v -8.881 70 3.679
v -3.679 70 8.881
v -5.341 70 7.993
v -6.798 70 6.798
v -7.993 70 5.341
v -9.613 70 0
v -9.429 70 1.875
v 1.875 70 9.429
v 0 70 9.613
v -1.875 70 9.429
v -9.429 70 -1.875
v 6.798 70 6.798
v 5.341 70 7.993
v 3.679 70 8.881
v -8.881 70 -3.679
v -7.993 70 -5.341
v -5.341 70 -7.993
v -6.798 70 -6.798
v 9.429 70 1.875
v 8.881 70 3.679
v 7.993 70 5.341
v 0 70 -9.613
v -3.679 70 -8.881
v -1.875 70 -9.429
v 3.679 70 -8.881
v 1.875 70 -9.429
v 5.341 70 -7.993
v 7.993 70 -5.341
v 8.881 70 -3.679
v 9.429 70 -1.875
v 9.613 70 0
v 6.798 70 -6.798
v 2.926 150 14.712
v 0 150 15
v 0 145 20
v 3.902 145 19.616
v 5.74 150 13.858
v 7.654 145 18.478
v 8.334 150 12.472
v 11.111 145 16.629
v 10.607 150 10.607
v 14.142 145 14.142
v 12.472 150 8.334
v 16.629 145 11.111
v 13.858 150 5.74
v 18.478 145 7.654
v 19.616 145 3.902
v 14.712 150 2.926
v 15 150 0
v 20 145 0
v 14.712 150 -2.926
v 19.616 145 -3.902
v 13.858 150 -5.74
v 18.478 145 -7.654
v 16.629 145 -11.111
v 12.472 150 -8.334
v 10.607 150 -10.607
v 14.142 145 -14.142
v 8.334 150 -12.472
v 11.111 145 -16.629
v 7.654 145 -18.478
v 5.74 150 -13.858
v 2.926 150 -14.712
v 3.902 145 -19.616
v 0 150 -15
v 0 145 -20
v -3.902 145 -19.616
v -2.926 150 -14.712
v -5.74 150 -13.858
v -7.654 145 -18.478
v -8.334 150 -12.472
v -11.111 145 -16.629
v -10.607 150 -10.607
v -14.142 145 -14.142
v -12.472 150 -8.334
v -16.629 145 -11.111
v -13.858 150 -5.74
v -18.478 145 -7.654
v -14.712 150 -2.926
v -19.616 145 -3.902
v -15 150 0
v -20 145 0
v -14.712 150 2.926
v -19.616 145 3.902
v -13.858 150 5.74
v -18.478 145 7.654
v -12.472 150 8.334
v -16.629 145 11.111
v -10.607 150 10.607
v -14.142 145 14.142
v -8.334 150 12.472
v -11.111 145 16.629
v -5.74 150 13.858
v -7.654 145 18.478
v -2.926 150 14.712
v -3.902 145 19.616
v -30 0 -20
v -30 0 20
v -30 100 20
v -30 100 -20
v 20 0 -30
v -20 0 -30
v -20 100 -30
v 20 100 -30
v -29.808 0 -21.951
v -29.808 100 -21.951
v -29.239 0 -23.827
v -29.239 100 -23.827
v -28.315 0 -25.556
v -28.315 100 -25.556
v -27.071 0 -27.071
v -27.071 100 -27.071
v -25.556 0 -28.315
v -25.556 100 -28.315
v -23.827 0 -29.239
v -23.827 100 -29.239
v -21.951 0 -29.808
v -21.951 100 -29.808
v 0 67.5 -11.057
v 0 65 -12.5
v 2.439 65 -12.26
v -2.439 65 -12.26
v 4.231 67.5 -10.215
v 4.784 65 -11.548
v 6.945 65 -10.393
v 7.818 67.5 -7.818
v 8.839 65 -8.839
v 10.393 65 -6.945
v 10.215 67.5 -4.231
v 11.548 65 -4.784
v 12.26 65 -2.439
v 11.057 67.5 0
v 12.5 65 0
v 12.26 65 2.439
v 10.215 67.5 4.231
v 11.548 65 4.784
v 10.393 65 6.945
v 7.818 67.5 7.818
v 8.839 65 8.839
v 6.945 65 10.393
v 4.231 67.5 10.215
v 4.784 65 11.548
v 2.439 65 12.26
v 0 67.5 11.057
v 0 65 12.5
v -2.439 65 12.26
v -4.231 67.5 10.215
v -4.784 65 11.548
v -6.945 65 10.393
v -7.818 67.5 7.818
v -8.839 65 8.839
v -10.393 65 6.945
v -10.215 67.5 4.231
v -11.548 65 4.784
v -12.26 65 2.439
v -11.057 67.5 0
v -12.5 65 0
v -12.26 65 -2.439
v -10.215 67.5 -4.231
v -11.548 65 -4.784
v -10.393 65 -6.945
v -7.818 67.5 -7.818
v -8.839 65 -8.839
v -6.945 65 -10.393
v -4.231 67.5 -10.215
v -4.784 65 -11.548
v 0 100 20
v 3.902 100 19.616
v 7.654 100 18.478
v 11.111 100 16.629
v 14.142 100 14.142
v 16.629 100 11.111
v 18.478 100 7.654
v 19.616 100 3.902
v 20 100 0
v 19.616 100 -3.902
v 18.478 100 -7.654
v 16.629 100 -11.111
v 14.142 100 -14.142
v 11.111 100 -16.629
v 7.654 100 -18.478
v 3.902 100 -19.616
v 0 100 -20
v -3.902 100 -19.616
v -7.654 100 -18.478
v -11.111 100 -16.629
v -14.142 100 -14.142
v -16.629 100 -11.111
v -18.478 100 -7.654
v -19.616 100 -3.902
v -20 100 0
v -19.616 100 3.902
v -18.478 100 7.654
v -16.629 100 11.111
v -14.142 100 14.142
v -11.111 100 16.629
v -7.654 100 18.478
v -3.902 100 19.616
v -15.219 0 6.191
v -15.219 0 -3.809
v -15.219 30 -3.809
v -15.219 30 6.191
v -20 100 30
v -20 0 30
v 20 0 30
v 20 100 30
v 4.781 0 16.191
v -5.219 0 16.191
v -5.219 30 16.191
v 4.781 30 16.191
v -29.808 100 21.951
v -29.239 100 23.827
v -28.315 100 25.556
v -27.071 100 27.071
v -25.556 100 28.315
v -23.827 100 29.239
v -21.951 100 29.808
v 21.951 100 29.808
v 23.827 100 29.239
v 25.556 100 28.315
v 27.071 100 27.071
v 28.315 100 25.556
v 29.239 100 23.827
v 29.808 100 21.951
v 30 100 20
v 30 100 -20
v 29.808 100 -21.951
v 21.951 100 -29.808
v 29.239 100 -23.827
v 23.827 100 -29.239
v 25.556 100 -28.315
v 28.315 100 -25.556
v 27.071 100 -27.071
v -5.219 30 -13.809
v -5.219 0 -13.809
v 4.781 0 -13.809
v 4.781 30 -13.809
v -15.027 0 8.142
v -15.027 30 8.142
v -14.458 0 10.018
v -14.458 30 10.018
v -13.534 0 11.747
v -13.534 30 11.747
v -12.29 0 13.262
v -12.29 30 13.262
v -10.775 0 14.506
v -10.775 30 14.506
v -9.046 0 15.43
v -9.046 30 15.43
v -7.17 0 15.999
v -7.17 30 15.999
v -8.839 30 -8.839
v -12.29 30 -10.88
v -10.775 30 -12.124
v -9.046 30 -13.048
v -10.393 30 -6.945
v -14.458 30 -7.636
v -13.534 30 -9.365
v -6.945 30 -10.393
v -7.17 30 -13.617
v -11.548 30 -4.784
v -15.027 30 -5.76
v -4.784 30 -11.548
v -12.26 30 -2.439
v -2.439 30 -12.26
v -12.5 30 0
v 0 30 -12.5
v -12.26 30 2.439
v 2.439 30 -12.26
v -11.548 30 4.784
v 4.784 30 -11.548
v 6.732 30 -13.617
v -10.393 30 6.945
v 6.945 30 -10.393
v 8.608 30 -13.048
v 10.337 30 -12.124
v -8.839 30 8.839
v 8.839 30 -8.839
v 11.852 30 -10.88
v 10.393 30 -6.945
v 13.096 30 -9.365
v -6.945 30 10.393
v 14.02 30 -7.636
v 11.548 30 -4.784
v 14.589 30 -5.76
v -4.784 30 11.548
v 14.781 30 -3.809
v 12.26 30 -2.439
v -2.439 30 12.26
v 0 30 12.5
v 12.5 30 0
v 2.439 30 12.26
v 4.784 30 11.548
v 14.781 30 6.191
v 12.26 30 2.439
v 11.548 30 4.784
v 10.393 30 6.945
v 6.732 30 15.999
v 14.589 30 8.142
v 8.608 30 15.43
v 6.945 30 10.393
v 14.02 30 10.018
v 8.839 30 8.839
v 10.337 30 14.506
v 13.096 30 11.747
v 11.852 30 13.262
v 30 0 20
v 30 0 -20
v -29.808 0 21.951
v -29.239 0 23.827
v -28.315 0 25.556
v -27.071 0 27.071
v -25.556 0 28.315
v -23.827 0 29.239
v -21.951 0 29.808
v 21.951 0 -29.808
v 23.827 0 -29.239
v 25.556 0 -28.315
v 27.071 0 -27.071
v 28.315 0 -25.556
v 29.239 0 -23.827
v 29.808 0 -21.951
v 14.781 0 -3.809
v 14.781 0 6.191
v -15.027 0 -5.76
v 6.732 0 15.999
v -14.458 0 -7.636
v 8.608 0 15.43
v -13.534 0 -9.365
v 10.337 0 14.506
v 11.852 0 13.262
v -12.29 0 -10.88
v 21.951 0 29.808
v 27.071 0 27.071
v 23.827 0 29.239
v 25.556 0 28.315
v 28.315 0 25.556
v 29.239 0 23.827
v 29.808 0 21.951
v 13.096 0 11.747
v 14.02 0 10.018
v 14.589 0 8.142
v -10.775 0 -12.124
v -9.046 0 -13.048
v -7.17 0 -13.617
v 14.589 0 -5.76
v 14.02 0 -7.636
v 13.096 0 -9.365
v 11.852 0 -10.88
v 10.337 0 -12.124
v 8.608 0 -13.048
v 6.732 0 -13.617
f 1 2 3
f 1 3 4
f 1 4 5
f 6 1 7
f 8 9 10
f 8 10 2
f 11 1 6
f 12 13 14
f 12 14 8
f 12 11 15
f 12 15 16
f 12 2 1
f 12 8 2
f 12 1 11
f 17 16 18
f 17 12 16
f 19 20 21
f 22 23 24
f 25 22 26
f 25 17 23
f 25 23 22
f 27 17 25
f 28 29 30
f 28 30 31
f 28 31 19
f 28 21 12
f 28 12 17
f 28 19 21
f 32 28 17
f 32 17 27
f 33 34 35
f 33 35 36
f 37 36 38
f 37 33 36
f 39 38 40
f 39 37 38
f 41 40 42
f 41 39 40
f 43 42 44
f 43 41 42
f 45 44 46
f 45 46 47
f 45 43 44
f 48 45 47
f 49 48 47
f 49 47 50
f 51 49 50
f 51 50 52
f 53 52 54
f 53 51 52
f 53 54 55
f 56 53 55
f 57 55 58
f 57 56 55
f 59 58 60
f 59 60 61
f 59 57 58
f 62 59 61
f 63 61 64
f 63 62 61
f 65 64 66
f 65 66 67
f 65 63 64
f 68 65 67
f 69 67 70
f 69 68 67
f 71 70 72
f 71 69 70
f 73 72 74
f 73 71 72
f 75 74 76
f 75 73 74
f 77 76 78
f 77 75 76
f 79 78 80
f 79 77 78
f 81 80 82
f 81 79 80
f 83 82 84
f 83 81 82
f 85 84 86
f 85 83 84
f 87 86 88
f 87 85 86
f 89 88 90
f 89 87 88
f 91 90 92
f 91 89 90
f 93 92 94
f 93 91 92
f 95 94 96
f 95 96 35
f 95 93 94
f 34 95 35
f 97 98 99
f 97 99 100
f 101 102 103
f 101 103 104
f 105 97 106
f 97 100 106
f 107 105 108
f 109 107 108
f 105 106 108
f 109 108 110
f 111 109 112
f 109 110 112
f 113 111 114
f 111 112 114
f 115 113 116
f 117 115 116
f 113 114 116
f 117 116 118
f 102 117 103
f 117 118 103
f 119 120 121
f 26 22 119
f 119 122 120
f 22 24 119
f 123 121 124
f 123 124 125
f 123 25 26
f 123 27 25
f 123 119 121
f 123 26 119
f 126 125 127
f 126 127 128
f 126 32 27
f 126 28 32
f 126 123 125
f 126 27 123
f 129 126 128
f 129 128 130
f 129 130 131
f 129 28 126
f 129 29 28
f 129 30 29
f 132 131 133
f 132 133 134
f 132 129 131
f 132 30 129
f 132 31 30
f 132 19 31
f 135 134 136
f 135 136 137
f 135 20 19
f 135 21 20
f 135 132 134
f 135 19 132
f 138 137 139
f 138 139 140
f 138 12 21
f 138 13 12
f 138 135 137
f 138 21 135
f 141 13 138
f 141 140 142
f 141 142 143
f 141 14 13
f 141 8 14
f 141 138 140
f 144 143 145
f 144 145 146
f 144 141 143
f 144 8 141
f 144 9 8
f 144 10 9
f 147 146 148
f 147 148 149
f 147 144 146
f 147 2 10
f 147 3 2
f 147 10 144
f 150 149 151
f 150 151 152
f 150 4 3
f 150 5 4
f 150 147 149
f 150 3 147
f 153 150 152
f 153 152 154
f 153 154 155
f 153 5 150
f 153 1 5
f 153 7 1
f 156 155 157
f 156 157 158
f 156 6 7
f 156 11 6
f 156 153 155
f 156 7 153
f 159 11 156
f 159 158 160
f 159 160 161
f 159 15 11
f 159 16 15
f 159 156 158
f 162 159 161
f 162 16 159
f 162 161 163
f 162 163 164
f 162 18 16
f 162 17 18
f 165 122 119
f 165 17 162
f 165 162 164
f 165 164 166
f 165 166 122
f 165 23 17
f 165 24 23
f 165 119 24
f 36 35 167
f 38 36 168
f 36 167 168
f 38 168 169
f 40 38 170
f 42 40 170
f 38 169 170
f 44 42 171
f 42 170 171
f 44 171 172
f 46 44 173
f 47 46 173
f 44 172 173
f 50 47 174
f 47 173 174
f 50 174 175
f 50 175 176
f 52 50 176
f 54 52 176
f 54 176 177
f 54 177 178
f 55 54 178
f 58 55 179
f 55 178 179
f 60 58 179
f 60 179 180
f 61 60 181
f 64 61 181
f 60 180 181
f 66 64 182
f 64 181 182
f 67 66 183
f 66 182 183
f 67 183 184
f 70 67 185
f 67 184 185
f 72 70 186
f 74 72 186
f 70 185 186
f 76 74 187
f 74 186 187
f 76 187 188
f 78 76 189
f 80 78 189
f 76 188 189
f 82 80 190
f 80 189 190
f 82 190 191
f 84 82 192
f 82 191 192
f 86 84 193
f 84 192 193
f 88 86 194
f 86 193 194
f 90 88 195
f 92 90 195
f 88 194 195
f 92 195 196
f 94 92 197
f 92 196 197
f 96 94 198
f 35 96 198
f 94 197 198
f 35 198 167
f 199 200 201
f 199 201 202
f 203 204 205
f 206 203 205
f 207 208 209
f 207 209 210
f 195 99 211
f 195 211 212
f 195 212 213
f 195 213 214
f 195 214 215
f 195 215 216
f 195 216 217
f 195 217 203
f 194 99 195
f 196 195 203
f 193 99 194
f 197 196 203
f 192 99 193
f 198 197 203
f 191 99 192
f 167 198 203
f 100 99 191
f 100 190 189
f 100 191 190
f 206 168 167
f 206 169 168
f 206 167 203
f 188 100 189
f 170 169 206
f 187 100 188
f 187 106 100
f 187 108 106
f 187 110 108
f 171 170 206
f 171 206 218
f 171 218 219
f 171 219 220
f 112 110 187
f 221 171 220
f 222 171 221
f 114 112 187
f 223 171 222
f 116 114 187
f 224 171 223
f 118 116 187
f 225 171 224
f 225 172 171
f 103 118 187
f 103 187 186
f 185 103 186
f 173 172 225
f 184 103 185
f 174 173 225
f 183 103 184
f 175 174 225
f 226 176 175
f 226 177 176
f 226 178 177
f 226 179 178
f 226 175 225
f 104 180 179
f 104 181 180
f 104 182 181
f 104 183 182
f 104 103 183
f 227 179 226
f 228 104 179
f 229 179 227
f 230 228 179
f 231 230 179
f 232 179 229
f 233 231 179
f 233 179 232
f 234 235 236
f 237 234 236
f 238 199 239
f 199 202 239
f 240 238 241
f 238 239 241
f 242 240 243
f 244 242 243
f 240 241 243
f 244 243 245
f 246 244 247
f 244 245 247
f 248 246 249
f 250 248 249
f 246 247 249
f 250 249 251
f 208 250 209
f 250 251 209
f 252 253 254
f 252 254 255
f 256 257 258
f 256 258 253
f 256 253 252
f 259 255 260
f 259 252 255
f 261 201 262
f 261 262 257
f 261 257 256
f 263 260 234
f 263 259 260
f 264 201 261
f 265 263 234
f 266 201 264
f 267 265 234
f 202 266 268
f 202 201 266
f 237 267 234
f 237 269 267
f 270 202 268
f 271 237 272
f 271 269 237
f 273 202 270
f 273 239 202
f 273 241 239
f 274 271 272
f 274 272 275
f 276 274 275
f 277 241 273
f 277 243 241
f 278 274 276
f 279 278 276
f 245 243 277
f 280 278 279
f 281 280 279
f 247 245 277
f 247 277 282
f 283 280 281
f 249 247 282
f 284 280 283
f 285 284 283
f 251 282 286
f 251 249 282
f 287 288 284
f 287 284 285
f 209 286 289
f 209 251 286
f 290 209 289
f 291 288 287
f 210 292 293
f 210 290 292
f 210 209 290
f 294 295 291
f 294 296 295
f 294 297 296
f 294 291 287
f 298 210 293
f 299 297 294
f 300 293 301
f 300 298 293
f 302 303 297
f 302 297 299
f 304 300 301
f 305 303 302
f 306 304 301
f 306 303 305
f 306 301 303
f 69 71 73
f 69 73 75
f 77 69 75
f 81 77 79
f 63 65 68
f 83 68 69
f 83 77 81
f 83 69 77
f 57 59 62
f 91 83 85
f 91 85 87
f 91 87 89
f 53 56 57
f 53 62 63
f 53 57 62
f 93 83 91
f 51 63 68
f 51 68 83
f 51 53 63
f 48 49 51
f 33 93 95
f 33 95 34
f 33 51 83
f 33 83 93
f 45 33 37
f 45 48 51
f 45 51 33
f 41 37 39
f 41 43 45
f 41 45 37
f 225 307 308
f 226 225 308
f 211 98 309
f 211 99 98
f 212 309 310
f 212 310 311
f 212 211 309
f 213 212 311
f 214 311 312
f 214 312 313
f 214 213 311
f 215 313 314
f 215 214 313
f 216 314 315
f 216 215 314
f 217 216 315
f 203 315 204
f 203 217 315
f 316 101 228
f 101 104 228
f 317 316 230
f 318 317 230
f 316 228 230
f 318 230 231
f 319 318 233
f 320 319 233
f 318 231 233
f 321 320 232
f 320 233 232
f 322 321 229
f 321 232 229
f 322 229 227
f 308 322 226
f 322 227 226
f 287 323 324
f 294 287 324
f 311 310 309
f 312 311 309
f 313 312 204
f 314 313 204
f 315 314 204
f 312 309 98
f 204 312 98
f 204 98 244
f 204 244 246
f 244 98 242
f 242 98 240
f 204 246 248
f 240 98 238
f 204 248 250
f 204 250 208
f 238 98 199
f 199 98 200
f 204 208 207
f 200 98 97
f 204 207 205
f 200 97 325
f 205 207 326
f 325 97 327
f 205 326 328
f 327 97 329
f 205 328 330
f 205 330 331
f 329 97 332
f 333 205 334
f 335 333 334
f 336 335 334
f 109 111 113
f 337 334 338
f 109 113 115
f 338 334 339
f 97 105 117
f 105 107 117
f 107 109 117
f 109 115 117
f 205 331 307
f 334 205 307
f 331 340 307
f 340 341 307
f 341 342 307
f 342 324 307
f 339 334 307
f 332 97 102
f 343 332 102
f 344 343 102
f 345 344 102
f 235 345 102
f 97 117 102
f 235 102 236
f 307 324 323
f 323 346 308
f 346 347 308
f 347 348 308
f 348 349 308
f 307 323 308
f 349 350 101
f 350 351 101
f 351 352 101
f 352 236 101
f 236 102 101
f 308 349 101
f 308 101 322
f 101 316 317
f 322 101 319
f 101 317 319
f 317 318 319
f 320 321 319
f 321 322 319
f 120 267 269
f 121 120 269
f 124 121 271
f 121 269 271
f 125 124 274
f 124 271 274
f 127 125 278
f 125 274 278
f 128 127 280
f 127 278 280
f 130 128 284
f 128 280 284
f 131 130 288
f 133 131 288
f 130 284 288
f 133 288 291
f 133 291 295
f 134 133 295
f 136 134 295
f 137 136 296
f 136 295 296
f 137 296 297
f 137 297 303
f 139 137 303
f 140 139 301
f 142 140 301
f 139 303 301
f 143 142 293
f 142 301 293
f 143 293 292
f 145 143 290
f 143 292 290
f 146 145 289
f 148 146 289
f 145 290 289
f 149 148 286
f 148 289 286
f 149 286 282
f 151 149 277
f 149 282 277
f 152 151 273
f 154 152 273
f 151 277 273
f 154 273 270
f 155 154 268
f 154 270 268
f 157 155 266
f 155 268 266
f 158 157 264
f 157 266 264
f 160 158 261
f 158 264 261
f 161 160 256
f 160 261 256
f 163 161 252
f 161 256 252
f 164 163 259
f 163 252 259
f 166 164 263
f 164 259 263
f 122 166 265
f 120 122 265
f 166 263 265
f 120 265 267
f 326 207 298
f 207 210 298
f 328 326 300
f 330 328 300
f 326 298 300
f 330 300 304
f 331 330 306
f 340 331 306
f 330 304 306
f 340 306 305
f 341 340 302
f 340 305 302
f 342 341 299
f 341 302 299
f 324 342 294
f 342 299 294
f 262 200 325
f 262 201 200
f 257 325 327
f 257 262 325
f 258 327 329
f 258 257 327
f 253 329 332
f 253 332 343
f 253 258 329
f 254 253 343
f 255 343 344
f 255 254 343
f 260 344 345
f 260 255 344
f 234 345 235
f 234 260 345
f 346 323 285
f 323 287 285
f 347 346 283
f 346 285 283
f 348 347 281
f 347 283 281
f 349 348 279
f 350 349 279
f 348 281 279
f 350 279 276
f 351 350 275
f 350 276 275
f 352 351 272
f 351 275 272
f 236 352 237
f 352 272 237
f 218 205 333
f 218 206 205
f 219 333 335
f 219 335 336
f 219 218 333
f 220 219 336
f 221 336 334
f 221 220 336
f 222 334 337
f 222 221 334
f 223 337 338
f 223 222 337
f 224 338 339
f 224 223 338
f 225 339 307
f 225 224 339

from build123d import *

# Parameters (mm, degrees)
SKETCH1_W           = 60
SKETCH1_H           = 60
BOSS_EXTRUDE1_DEPTH = 100
SKETCH2_R           = 20
BOSS_EXTRUDE2_DEPTH = 50
SKETCH3_W           = 30
SKETCH3_H           = 30
CUT_EXTRUDE1_DEPTH  = 30
SKETCH6_R           = 12.5
CUT_EXTRUDE7_DEPTH  = 40
FILLET1_R           = 10
FILLET2_R           = 10
CHAMFER1_SIZE       = 5
CHAMFER2_SIZE       = 5
CHAMFER2_SIZE2      = 2.886751346


with BuildPart() as part:
    # Sketch1 → Boss-Extrude1 (new body)
    with BuildSketch(Plane(origin=(0, 0, 0), x_dir=(1, 0, 0), z_dir=(0, 1, 0))):
        Rectangle(SKETCH1_W, SKETCH1_H)
    extrude(amount=BOSS_EXTRUDE1_DEPTH)

    # Sketch2 → Boss-Extrude2 (add)
    with BuildSketch(Plane(origin=(0, 100, 0), x_dir=(1, 0, 0), z_dir=(0, 1, 0))):
        with Locations(Location((0, 0, 0), (0, 0, 270))):
            Circle(SKETCH2_R)
    extrude(amount=BOSS_EXTRUDE2_DEPTH)

    # Sketch3 → Cut-Extrude1 (cut)
    with BuildSketch(Plane.XZ):
        with Locations((-0.219000236, 1.191138379)):
            Rectangle(SKETCH3_W, SKETCH3_H)
    extrude(amount=-CUT_EXTRUDE1_DEPTH, mode=Mode.SUBTRACT)

    # Sketch6 → Cut-Extrude7 (cut)
    with BuildSketch(Plane.XZ.offset(-30)):
        with Locations(Location((0, 0, 0), (0, 0, 270))):
            Circle(SKETCH6_R)
    extrude(amount=-CUT_EXTRUDE7_DEPTH, mode=Mode.SUBTRACT)

    # Fillet1
    fillet1_edges = [part.edges().sort_by_distance(p)[0] for p in [
        (-30, 50, -30),
        (-30, 50, 30),
        (30, 50, 30),
        (30, 50, -30),
    ]]
    fillet(fillet1_edges, radius=FILLET1_R)

    # Fillet2
    fillet2_edges = [part.edges().sort_by_distance(p)[0] for p in [
        (-15.219000236, 15, -13.808861621),
        (-15.219000236, 15, 16.191138379),
        (14.780999764, 15, 16.191138379),
        (14.780999764, 15, -13.808861621),
    ]]
    fillet(fillet2_edges, radius=FILLET2_R)

    # Chamfer1
    chamfer1_edges = [part.edges().sort_by_distance(p)[0] for p in [
        (0, 150, -20),
    ]]
    chamfer(chamfer1_edges, length=CHAMFER1_SIZE)

    # Chamfer2
    chamfer2_edges = [part.edges().sort_by_distance(p)[0] for p in [
        (0, 70, 12.5),
    ]]
    chamfer2_side = [part.faces().sort_by_distance(p)[0] for p in [
        (0, 50, 12.5),
    ]]
    chamfer(chamfer2_edges, length=CHAMFER2_SIZE, length2=CHAMFER2_SIZE2, reference=chamfer2_side[0])


solid = part.part
